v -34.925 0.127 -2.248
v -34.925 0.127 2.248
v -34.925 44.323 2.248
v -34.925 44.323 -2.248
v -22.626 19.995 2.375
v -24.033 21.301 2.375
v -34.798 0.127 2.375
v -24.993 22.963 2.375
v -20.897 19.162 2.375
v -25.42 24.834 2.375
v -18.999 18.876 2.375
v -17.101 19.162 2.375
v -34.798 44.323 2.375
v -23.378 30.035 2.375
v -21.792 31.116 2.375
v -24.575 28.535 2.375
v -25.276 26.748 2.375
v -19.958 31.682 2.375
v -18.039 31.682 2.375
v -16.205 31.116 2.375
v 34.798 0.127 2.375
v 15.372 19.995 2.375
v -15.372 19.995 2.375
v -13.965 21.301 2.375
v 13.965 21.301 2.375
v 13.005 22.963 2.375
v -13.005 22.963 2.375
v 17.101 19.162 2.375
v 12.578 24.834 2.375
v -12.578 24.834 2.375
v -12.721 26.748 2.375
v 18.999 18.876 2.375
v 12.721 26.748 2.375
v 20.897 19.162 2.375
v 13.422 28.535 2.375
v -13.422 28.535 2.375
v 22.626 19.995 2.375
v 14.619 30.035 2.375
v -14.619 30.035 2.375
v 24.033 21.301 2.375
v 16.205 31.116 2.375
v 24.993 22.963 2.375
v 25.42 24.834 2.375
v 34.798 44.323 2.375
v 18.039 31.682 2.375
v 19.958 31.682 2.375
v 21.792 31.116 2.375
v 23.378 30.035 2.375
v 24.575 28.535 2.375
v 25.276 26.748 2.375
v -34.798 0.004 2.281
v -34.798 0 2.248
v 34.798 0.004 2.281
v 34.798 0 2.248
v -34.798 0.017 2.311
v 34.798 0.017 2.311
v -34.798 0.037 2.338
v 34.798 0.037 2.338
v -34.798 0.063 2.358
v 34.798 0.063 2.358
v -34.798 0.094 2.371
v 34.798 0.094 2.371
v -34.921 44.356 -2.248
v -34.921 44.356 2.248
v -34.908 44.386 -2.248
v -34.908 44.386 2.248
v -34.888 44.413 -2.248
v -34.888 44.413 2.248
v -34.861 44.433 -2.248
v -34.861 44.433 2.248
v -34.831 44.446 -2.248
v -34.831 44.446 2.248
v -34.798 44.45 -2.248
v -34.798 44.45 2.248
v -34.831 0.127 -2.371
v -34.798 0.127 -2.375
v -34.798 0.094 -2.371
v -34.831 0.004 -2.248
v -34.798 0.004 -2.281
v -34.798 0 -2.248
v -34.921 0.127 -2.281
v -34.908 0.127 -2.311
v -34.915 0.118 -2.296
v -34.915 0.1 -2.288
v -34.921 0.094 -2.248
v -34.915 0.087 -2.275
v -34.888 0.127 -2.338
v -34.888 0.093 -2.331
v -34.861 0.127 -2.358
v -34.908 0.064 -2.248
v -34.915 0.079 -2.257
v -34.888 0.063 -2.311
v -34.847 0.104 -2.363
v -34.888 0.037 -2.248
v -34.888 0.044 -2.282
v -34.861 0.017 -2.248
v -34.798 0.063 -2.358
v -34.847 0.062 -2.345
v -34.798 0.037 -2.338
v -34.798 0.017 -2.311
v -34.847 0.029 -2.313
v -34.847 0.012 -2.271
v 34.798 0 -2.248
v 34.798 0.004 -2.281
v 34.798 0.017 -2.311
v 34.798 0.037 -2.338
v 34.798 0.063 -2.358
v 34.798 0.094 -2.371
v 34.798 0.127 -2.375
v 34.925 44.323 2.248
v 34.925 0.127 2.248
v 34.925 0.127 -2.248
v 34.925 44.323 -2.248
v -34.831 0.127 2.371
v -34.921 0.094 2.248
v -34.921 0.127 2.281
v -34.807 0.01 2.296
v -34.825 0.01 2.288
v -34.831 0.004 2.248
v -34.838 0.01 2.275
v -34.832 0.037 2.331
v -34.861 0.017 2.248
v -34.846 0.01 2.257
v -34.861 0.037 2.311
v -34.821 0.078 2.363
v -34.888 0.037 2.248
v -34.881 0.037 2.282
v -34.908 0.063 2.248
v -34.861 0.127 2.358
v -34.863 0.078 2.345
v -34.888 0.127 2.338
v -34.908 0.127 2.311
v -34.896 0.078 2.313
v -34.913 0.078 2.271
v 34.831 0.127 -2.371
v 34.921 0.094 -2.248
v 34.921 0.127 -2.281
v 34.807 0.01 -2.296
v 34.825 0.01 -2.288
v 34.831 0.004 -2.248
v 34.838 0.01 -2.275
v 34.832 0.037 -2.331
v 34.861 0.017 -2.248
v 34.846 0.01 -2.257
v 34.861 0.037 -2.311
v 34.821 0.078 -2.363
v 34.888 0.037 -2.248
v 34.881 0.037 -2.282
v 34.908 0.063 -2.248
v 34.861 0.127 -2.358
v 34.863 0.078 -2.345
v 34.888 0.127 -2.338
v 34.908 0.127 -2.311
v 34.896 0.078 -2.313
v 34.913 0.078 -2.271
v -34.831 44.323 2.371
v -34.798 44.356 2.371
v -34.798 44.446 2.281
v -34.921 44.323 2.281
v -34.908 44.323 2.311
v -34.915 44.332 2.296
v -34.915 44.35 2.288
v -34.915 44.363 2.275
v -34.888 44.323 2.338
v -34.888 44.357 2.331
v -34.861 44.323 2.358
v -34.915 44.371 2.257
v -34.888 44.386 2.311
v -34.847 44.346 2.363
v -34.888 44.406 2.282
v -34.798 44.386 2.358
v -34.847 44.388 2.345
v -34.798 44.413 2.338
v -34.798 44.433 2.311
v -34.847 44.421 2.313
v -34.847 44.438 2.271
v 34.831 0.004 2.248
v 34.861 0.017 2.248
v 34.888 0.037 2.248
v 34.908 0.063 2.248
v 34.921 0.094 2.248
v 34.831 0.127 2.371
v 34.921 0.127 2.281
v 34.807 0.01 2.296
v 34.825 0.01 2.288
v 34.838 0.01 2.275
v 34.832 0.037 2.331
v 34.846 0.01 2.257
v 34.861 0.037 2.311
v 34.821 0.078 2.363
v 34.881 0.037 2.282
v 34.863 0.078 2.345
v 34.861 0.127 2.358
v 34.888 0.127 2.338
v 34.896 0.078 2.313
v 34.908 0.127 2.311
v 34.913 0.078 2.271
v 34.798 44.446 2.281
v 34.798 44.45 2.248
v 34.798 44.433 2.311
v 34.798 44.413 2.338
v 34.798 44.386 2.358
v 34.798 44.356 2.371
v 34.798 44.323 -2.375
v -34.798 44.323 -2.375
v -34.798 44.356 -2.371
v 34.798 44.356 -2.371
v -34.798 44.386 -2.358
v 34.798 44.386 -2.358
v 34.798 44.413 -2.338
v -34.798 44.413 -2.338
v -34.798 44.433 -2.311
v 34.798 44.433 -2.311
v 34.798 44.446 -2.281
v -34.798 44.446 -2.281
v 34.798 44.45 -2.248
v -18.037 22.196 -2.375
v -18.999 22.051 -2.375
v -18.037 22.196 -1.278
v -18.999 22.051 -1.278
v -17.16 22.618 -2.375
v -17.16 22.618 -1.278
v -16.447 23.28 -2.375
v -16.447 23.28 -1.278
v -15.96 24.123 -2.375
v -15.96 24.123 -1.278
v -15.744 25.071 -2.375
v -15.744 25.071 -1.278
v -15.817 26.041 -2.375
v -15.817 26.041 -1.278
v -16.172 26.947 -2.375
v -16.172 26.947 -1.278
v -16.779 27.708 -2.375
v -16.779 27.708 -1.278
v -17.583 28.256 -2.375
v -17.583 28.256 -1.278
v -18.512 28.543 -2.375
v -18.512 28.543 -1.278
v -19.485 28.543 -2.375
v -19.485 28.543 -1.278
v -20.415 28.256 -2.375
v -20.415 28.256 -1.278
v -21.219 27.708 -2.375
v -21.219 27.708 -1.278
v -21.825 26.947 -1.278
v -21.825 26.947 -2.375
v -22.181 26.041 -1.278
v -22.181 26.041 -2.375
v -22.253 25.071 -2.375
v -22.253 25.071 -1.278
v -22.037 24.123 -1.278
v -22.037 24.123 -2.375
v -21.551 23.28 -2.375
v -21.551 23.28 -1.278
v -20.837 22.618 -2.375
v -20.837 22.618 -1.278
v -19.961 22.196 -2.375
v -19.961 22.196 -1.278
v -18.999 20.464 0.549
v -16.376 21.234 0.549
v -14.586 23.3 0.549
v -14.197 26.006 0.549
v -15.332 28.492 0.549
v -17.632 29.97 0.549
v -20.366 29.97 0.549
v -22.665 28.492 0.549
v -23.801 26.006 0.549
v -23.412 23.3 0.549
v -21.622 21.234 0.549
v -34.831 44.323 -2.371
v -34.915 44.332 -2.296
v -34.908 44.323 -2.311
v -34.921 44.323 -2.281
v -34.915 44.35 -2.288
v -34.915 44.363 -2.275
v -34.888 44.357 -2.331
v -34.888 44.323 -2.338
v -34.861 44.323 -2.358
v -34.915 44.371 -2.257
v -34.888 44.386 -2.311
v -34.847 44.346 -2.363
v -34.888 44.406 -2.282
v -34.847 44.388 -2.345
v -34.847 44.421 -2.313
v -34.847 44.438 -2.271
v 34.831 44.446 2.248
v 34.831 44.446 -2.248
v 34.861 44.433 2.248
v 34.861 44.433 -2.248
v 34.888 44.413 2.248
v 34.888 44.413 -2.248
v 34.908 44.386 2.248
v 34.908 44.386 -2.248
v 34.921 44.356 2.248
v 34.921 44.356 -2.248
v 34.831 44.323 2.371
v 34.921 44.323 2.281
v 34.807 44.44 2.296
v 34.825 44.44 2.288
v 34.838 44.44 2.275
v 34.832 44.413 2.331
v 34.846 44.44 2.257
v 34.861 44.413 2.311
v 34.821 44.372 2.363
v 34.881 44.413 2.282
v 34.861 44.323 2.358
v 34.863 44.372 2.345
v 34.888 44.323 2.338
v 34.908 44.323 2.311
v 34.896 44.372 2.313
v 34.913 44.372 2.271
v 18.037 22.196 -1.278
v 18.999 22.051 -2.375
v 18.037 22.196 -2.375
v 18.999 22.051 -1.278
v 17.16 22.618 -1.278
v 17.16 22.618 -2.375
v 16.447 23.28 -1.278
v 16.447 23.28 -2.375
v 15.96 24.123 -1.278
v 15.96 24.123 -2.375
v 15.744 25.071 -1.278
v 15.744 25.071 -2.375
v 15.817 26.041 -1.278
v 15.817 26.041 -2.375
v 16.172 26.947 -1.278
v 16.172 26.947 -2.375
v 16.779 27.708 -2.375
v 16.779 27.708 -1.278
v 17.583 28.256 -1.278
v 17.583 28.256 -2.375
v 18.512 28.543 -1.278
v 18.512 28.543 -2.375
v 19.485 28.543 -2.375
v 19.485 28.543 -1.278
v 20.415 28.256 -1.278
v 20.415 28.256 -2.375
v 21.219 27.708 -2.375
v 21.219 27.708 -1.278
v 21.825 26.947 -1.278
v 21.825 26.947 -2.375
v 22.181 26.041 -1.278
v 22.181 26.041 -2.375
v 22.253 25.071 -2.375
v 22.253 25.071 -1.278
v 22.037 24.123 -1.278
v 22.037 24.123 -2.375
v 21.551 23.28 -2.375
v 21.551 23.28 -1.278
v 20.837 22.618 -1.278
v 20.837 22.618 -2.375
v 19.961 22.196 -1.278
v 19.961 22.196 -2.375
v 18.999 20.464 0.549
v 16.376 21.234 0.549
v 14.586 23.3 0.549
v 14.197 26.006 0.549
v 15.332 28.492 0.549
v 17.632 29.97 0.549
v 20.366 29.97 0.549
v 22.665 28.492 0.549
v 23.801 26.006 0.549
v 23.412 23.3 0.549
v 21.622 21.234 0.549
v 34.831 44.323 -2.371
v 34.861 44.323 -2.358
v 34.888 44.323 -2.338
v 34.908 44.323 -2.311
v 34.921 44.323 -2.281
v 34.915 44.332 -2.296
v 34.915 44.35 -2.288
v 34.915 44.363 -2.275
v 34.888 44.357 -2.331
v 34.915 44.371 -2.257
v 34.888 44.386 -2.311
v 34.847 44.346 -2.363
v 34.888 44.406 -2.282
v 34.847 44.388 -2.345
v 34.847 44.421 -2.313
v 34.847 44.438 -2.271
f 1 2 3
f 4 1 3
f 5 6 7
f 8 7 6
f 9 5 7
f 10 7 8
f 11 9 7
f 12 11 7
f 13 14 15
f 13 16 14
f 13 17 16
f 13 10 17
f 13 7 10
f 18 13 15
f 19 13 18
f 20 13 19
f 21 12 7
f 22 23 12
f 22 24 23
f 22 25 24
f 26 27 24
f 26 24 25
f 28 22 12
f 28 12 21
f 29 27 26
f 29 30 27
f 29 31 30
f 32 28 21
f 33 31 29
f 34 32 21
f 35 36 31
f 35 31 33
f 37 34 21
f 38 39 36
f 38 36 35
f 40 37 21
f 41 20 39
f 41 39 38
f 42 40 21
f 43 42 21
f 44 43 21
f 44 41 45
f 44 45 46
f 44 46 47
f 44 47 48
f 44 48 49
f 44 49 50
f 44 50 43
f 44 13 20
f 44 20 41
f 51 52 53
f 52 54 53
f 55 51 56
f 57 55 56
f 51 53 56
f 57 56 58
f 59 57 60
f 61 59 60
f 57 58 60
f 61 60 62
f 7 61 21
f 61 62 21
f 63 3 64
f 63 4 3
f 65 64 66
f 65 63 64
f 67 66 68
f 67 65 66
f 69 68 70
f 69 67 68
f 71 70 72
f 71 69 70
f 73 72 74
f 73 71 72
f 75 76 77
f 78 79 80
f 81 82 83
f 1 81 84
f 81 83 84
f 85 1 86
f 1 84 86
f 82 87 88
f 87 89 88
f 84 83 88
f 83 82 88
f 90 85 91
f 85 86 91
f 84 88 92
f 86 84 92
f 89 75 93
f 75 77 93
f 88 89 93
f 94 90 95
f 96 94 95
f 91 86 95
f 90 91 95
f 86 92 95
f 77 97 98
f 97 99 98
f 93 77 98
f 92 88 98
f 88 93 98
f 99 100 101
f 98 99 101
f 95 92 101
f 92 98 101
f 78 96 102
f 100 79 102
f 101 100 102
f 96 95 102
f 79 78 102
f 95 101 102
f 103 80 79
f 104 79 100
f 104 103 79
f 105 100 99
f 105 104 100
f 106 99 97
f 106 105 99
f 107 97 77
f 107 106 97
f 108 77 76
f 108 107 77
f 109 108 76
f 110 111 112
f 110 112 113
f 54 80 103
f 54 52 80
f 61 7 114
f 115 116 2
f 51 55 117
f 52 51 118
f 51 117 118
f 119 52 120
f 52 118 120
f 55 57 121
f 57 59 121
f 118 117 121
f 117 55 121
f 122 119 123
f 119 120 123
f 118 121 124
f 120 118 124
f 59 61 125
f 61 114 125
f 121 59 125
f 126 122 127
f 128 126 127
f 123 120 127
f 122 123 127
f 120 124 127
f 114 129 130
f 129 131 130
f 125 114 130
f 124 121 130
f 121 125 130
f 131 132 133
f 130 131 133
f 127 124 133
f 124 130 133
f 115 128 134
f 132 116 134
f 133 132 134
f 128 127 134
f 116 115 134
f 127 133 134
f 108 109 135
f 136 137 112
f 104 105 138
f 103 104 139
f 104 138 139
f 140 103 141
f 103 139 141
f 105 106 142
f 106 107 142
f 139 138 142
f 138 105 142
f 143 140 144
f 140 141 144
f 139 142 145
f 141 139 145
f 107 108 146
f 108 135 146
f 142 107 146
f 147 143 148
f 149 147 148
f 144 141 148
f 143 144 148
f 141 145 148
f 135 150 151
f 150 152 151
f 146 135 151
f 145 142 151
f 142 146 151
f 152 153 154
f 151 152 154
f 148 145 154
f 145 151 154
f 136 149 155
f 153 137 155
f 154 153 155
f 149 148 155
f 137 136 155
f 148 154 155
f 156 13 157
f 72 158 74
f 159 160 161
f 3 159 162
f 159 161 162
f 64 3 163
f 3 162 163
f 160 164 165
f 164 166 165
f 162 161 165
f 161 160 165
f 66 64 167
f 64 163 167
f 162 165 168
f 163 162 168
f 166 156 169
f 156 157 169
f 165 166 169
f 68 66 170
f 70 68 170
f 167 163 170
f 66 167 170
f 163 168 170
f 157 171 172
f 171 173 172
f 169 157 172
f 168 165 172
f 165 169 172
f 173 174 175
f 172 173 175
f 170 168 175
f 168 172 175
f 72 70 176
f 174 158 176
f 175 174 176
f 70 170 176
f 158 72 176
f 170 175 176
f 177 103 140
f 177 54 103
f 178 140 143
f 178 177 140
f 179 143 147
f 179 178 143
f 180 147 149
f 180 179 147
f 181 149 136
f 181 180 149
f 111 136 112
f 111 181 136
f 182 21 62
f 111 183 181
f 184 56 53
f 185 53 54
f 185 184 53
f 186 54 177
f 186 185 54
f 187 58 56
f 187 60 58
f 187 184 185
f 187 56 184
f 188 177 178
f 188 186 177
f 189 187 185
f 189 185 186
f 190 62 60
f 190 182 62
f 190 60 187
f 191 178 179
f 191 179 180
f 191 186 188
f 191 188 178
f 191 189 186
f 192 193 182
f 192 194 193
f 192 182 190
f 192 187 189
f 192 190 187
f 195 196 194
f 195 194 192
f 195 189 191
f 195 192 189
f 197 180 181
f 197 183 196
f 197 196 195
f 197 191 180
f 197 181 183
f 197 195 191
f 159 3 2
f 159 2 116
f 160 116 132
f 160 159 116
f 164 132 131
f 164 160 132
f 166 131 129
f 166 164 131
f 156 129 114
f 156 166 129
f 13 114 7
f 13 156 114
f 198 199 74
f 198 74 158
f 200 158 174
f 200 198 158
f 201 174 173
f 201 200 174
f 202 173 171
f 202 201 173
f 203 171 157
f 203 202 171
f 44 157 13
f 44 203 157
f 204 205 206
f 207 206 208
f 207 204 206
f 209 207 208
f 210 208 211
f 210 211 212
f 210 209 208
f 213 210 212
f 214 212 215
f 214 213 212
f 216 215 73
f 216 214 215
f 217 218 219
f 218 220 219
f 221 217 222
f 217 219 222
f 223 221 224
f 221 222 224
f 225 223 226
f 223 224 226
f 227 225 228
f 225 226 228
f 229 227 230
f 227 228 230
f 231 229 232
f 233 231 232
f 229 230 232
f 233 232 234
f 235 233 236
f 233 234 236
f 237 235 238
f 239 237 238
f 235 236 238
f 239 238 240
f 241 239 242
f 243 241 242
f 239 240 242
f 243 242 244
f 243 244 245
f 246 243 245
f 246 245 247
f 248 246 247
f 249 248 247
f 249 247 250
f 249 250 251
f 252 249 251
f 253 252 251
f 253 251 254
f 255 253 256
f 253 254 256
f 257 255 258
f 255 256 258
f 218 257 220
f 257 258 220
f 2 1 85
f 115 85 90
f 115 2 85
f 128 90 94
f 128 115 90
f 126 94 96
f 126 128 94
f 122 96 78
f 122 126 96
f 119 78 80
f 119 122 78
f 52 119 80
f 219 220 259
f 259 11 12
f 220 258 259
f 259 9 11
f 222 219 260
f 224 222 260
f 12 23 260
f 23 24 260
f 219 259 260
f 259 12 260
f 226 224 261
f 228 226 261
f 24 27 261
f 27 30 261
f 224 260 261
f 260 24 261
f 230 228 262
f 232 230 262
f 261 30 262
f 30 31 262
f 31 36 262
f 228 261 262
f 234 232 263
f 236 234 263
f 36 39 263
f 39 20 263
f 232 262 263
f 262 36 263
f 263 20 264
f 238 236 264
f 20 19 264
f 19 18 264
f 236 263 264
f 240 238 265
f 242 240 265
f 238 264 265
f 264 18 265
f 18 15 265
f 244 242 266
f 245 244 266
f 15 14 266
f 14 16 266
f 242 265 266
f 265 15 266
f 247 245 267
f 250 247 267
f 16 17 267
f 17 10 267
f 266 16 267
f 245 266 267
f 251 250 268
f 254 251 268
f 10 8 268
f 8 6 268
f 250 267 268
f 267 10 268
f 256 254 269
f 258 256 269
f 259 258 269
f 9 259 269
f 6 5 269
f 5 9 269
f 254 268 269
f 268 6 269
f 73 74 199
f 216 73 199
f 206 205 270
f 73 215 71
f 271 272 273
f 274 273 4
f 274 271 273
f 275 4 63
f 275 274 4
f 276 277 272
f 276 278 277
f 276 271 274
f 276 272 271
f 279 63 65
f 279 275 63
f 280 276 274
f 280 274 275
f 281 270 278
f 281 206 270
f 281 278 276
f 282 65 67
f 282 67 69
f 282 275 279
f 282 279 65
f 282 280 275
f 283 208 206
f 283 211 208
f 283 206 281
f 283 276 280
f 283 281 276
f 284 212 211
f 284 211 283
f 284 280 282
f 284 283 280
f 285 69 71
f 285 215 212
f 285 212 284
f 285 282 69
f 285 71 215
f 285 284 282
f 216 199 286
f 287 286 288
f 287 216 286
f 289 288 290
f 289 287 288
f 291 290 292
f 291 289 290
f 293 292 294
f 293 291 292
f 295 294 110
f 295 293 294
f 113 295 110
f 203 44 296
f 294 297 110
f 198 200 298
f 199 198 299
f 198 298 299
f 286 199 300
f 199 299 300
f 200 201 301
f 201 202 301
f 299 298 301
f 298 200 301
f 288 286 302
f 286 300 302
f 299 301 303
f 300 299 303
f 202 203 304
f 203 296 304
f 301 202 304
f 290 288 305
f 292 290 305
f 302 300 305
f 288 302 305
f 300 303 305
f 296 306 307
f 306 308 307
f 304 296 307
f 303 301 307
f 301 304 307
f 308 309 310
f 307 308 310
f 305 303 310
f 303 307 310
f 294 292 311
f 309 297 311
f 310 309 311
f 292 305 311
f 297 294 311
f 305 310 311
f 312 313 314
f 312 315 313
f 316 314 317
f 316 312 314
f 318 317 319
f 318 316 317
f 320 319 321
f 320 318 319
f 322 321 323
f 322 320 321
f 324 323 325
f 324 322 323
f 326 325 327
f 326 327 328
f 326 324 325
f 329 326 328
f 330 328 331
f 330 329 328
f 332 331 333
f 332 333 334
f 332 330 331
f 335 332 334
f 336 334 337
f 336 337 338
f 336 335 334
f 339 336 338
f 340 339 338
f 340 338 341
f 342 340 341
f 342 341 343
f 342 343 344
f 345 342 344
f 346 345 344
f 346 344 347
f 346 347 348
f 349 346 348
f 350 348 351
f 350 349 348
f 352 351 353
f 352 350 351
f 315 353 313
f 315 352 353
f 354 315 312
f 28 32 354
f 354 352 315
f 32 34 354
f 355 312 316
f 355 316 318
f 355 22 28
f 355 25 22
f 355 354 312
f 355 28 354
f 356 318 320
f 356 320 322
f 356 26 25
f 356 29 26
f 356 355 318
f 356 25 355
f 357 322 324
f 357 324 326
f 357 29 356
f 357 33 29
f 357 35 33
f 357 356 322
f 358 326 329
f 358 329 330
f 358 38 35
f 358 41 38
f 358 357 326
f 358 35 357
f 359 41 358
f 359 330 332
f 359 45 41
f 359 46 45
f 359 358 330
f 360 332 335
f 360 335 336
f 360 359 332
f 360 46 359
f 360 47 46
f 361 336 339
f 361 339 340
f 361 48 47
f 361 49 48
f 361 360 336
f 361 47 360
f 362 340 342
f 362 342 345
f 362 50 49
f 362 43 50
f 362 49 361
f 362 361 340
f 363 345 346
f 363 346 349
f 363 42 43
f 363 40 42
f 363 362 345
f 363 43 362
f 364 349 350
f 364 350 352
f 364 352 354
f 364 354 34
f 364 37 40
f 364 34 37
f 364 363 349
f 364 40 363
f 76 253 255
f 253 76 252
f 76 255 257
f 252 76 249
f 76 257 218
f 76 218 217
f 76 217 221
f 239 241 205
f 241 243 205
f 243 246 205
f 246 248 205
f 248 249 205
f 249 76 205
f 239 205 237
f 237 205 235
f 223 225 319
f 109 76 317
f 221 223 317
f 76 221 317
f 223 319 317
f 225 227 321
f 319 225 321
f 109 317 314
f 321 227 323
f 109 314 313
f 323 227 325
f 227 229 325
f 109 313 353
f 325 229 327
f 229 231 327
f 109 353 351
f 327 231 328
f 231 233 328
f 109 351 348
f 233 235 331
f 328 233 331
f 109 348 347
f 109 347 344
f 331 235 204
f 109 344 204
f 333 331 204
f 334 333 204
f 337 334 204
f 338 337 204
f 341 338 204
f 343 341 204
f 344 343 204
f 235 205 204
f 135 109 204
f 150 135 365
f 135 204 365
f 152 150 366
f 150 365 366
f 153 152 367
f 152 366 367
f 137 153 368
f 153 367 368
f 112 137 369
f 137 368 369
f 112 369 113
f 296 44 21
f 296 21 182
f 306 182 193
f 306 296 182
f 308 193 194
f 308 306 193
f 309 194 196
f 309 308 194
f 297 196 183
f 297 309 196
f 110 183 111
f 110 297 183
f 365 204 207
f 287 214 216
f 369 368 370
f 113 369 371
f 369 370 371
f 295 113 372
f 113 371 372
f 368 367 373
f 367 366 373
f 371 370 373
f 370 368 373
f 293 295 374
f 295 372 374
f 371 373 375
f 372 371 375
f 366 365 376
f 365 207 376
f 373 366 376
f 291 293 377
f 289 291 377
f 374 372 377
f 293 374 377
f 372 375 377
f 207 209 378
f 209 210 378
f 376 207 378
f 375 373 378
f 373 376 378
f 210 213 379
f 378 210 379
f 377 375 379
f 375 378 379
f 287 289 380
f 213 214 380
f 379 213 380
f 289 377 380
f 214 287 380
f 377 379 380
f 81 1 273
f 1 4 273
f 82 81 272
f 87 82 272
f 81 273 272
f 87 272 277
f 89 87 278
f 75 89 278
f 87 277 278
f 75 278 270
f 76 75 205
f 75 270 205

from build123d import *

# Parameters (mm, degrees)
SKETCH1_W           = 69.85
SKETCH1_H           = 44.45
BOSS_EXTRUDE1_DEPTH = 2.3749
FILLET1_R           = 0.127


with BuildPart() as part:
    # Sketch1 → Boss-Extrude1 (new, symmetric)
    with BuildSketch(Plane.XY):
        with Locations((0, 22.225)):
            Rectangle(SKETCH1_W, SKETCH1_H)
    extrude(amount=BOSS_EXTRUDE1_DEPTH, both=True)

    # Sketch4 → CSK for 1/4 Flat Head Machine Screw2 (revolve, cut)
    with BuildSketch(Plane(origin=(18.998712013, 25.315105776, 2.3749), x_dir=(0, -1, 0), z_dir=(1, 0, 0))):
        Polygon((0, 0), (0, 4.7498), (3.2639, 4.7498), (3.2639, 3.652419693), (6.4389, 0), align=None)
    csk_for_1_4_flat_head_machine_screw2 = revolve(axis=Axis((18.998712013, 25.315105776, 8.7249), (0, 0, -1)), mode=Mode.SUBTRACT)

    # Mirror1: CSK for 1/4 Flat Head Machine Screw2 across plane
    add(csk_for_1_4_flat_head_machine_screw2.mirror(Plane(origin=(0, 0, 0), x_dir=(0, 0, 1), z_dir=(1, 0, 0))), mode=Mode.SUBTRACT)

    # Fillet1
    fillet1_edges = [part.edges().sort_by_distance(p)[0] for p in [
        (34.925, 22.225, 2.3749),
        (0, 44.45, 2.3749),
        (-34.925, 22.225, 2.3749),
        (0, 44.45, -2.3749),
        (34.925, 22.225, -2.3749),
        (0, 0, -2.3749),
        (-34.925, 22.225, -2.3749),
        (0, 0, 2.3749),
        (-34.925, 44.45, 0),
        (34.925, 44.45, 0),
        (34.925, 0, 0),
        (-34.925, 0, 0),
    ]]
    fillet(fillet1_edges, radius=FILLET1_R)


solid = part.part
